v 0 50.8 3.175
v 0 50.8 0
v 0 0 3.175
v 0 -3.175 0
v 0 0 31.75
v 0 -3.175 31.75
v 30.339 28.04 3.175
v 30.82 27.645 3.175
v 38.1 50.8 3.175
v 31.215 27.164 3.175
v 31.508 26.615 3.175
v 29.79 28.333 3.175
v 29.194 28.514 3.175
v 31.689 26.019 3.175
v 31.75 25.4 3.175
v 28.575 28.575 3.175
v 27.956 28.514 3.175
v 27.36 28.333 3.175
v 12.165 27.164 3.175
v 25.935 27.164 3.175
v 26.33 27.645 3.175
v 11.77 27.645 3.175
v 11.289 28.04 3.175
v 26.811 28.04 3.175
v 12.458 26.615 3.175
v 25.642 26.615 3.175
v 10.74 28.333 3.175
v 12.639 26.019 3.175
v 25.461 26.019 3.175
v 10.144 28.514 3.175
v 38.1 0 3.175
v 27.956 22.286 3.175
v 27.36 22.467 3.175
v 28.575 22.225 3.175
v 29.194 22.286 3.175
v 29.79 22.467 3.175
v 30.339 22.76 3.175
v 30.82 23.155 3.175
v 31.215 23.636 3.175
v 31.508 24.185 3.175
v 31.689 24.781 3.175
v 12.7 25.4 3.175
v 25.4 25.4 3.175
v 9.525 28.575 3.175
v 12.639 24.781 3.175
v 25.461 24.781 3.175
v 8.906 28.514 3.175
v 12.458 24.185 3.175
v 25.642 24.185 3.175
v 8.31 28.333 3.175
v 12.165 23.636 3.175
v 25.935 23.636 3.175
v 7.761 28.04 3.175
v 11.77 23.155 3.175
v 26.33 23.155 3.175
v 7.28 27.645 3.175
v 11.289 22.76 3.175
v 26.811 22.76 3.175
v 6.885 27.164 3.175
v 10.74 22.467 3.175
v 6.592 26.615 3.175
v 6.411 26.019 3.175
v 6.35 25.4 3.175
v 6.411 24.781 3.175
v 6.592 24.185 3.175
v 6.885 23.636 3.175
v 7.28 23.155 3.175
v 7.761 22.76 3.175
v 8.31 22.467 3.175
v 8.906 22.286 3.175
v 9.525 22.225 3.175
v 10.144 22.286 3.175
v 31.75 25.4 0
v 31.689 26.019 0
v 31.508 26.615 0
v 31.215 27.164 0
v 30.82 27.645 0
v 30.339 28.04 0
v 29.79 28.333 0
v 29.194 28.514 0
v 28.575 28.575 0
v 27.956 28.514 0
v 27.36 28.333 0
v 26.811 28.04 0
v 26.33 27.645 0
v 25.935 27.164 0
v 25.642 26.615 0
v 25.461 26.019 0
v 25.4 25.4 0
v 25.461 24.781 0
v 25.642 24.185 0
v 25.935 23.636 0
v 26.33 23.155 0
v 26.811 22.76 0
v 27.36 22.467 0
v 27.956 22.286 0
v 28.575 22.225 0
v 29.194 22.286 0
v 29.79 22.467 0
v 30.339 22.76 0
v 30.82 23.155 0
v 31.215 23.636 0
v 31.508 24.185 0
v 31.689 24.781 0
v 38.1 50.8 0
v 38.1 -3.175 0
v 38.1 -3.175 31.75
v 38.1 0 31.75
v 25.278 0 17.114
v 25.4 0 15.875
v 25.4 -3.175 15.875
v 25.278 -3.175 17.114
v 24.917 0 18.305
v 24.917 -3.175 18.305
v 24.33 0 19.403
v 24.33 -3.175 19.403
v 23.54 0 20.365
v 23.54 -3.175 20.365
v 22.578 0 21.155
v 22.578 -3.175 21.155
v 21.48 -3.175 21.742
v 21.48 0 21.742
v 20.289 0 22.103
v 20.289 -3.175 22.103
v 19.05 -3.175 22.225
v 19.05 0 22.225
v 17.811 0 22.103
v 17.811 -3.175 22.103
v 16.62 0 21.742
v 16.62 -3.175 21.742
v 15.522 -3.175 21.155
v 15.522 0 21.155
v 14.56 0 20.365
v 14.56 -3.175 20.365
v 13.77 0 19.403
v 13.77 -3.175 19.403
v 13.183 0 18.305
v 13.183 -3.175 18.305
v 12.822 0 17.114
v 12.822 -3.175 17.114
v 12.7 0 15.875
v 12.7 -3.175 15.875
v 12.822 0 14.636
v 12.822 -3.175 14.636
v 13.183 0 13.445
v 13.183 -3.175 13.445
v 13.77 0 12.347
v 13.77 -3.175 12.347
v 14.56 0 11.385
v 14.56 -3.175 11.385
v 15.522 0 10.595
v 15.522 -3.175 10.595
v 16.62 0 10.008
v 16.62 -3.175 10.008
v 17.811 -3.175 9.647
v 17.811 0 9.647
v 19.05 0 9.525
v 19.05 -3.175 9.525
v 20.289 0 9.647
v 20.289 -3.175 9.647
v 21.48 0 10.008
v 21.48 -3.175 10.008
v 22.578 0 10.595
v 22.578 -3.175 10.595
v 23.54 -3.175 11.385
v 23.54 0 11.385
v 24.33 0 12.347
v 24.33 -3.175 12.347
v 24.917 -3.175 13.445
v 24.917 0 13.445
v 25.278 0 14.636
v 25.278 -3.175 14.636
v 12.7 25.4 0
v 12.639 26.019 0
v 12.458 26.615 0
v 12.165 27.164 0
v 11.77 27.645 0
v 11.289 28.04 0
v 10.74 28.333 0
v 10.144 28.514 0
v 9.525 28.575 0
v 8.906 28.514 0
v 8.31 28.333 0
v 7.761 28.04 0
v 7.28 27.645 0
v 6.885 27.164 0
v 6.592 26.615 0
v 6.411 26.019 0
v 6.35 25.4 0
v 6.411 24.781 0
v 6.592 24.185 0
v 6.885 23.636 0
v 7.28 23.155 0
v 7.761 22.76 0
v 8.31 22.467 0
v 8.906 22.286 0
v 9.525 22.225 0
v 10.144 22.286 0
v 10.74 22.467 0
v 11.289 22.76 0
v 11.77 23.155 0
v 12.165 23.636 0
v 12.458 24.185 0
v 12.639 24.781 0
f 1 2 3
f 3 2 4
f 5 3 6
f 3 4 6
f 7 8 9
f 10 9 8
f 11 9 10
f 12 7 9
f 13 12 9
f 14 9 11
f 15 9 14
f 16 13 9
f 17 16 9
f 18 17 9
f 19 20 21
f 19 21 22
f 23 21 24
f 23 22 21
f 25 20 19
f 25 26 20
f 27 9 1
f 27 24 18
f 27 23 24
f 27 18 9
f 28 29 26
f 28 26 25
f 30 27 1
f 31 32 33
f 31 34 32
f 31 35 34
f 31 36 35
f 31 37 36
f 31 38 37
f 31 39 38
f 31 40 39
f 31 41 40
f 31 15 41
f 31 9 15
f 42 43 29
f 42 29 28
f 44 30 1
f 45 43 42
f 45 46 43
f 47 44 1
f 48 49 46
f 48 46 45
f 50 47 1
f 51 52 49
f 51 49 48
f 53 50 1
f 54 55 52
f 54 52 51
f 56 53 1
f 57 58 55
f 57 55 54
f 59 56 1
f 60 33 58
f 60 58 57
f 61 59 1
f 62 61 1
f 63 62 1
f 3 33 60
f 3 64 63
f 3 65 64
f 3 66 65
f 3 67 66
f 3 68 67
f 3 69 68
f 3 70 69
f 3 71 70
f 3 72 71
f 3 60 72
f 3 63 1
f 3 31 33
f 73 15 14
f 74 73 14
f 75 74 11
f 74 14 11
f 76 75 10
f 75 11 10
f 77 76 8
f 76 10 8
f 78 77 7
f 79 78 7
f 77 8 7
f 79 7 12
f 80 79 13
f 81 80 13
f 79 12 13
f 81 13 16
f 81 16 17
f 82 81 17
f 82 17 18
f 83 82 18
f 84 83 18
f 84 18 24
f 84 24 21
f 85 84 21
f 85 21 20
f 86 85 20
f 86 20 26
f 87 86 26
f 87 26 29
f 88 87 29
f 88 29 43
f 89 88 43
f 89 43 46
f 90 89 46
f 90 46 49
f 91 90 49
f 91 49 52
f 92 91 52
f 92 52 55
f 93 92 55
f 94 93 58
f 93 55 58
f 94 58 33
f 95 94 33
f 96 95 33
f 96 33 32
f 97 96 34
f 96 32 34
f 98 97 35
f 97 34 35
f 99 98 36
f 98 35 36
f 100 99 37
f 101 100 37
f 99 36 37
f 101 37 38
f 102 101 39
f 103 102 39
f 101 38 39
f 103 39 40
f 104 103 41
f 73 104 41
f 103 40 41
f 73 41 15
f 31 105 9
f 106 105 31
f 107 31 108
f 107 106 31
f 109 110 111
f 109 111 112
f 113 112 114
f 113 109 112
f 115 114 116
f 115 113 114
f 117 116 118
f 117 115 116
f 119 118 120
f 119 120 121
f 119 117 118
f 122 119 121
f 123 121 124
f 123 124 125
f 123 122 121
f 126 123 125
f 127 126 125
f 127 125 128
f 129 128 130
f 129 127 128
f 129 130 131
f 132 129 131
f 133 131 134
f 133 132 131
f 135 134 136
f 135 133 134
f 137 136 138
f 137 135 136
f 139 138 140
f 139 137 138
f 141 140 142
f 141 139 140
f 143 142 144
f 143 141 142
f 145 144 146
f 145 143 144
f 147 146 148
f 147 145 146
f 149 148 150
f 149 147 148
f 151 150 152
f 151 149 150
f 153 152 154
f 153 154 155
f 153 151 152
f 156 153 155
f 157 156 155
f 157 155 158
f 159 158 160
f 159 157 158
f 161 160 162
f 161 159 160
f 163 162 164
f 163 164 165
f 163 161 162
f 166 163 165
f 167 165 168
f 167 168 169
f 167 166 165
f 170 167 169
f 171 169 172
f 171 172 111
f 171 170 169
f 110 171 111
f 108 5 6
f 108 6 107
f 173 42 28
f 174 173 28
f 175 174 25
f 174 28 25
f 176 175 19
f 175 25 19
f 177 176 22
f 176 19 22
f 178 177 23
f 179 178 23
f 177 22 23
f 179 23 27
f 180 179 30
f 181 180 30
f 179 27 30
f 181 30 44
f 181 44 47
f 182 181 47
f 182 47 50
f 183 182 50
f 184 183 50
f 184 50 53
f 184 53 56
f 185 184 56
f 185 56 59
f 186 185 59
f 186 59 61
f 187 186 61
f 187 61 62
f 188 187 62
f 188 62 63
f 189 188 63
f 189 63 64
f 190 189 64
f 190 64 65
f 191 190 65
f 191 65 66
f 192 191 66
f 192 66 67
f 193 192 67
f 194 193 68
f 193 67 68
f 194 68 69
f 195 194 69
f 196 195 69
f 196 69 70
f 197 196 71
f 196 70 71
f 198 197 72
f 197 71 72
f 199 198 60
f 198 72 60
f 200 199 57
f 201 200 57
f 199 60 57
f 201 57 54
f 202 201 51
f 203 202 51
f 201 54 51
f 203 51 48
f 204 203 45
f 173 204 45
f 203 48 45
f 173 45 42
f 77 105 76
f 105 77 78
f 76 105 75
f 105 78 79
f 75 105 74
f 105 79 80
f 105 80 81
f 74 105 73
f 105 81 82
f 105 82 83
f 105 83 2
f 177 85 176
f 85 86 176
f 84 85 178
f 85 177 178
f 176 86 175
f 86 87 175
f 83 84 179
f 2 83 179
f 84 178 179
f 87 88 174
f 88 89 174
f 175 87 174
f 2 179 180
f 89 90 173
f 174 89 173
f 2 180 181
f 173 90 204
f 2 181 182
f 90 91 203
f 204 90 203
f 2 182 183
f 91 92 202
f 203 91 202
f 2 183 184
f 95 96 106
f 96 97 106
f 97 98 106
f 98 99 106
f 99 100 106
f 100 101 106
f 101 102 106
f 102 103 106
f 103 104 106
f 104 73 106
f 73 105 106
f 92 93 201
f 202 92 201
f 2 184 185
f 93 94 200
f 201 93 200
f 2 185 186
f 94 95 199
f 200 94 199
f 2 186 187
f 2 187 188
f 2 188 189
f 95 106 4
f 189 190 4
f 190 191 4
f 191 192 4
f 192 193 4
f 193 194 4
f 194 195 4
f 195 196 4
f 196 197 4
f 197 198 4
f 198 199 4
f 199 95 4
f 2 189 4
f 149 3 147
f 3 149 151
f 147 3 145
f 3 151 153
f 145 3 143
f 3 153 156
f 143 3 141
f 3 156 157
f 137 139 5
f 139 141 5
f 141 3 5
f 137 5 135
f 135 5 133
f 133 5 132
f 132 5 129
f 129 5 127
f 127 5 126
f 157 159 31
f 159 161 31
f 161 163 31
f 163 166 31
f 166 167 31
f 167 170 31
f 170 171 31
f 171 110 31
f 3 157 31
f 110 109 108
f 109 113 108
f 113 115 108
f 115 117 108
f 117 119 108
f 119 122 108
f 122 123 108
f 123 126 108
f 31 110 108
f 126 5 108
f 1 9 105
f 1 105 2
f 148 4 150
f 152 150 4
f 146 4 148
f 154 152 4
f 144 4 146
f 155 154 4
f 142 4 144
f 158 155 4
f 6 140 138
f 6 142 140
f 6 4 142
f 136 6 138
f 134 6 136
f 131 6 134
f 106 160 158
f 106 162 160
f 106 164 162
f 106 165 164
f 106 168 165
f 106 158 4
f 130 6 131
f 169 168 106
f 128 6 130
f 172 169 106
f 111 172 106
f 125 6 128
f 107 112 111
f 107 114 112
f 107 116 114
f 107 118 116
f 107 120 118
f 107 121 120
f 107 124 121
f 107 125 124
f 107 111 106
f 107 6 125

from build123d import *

# Parameters (mm, degrees)
F0_W     = 38.1
F0_H     = 31.75
F0_R     = 6.35
F1_DEPTH = 3.175
F2_W     = 38.1
F2_H     = 3.175
F3_DEPTH = 50.8
F4_R     = 3.175
F5_DEPTH = 3.176


with BuildPart() as f1:
    # F0 (on Front) → F1 (new body)
    with BuildSketch(Plane.XZ):
        with Locations((19.05, 15.875)):
            Rectangle(F0_W, F0_H)
        with Locations((19.05, 15.875)):
            Circle(F0_R, mode=Mode.SUBTRACT)
    extrude(amount=F1_DEPTH)

    # F2 (on face) → F3 (join)
    with BuildSketch(Plane(origin=(0, 0, 0), x_dir=(-1, 0, 0), z_dir=(0, 1, 0))):
        with Locations((-19.05, 1.5875)):
            Rectangle(F2_W, F2_H)
    extrude(amount=F3_DEPTH)

    # F4 (on face) → F5 (cut, through all)
    with BuildSketch(Plane.XY.offset(3.175)):
        with Locations((28.575, 25.4)):
            Circle(F4_R)
        with Locations((9.525, 25.4)):
            Circle(F4_R)
    extrude(amount=-F5_DEPTH, mode=Mode.SUBTRACT)


solid = f1.part
